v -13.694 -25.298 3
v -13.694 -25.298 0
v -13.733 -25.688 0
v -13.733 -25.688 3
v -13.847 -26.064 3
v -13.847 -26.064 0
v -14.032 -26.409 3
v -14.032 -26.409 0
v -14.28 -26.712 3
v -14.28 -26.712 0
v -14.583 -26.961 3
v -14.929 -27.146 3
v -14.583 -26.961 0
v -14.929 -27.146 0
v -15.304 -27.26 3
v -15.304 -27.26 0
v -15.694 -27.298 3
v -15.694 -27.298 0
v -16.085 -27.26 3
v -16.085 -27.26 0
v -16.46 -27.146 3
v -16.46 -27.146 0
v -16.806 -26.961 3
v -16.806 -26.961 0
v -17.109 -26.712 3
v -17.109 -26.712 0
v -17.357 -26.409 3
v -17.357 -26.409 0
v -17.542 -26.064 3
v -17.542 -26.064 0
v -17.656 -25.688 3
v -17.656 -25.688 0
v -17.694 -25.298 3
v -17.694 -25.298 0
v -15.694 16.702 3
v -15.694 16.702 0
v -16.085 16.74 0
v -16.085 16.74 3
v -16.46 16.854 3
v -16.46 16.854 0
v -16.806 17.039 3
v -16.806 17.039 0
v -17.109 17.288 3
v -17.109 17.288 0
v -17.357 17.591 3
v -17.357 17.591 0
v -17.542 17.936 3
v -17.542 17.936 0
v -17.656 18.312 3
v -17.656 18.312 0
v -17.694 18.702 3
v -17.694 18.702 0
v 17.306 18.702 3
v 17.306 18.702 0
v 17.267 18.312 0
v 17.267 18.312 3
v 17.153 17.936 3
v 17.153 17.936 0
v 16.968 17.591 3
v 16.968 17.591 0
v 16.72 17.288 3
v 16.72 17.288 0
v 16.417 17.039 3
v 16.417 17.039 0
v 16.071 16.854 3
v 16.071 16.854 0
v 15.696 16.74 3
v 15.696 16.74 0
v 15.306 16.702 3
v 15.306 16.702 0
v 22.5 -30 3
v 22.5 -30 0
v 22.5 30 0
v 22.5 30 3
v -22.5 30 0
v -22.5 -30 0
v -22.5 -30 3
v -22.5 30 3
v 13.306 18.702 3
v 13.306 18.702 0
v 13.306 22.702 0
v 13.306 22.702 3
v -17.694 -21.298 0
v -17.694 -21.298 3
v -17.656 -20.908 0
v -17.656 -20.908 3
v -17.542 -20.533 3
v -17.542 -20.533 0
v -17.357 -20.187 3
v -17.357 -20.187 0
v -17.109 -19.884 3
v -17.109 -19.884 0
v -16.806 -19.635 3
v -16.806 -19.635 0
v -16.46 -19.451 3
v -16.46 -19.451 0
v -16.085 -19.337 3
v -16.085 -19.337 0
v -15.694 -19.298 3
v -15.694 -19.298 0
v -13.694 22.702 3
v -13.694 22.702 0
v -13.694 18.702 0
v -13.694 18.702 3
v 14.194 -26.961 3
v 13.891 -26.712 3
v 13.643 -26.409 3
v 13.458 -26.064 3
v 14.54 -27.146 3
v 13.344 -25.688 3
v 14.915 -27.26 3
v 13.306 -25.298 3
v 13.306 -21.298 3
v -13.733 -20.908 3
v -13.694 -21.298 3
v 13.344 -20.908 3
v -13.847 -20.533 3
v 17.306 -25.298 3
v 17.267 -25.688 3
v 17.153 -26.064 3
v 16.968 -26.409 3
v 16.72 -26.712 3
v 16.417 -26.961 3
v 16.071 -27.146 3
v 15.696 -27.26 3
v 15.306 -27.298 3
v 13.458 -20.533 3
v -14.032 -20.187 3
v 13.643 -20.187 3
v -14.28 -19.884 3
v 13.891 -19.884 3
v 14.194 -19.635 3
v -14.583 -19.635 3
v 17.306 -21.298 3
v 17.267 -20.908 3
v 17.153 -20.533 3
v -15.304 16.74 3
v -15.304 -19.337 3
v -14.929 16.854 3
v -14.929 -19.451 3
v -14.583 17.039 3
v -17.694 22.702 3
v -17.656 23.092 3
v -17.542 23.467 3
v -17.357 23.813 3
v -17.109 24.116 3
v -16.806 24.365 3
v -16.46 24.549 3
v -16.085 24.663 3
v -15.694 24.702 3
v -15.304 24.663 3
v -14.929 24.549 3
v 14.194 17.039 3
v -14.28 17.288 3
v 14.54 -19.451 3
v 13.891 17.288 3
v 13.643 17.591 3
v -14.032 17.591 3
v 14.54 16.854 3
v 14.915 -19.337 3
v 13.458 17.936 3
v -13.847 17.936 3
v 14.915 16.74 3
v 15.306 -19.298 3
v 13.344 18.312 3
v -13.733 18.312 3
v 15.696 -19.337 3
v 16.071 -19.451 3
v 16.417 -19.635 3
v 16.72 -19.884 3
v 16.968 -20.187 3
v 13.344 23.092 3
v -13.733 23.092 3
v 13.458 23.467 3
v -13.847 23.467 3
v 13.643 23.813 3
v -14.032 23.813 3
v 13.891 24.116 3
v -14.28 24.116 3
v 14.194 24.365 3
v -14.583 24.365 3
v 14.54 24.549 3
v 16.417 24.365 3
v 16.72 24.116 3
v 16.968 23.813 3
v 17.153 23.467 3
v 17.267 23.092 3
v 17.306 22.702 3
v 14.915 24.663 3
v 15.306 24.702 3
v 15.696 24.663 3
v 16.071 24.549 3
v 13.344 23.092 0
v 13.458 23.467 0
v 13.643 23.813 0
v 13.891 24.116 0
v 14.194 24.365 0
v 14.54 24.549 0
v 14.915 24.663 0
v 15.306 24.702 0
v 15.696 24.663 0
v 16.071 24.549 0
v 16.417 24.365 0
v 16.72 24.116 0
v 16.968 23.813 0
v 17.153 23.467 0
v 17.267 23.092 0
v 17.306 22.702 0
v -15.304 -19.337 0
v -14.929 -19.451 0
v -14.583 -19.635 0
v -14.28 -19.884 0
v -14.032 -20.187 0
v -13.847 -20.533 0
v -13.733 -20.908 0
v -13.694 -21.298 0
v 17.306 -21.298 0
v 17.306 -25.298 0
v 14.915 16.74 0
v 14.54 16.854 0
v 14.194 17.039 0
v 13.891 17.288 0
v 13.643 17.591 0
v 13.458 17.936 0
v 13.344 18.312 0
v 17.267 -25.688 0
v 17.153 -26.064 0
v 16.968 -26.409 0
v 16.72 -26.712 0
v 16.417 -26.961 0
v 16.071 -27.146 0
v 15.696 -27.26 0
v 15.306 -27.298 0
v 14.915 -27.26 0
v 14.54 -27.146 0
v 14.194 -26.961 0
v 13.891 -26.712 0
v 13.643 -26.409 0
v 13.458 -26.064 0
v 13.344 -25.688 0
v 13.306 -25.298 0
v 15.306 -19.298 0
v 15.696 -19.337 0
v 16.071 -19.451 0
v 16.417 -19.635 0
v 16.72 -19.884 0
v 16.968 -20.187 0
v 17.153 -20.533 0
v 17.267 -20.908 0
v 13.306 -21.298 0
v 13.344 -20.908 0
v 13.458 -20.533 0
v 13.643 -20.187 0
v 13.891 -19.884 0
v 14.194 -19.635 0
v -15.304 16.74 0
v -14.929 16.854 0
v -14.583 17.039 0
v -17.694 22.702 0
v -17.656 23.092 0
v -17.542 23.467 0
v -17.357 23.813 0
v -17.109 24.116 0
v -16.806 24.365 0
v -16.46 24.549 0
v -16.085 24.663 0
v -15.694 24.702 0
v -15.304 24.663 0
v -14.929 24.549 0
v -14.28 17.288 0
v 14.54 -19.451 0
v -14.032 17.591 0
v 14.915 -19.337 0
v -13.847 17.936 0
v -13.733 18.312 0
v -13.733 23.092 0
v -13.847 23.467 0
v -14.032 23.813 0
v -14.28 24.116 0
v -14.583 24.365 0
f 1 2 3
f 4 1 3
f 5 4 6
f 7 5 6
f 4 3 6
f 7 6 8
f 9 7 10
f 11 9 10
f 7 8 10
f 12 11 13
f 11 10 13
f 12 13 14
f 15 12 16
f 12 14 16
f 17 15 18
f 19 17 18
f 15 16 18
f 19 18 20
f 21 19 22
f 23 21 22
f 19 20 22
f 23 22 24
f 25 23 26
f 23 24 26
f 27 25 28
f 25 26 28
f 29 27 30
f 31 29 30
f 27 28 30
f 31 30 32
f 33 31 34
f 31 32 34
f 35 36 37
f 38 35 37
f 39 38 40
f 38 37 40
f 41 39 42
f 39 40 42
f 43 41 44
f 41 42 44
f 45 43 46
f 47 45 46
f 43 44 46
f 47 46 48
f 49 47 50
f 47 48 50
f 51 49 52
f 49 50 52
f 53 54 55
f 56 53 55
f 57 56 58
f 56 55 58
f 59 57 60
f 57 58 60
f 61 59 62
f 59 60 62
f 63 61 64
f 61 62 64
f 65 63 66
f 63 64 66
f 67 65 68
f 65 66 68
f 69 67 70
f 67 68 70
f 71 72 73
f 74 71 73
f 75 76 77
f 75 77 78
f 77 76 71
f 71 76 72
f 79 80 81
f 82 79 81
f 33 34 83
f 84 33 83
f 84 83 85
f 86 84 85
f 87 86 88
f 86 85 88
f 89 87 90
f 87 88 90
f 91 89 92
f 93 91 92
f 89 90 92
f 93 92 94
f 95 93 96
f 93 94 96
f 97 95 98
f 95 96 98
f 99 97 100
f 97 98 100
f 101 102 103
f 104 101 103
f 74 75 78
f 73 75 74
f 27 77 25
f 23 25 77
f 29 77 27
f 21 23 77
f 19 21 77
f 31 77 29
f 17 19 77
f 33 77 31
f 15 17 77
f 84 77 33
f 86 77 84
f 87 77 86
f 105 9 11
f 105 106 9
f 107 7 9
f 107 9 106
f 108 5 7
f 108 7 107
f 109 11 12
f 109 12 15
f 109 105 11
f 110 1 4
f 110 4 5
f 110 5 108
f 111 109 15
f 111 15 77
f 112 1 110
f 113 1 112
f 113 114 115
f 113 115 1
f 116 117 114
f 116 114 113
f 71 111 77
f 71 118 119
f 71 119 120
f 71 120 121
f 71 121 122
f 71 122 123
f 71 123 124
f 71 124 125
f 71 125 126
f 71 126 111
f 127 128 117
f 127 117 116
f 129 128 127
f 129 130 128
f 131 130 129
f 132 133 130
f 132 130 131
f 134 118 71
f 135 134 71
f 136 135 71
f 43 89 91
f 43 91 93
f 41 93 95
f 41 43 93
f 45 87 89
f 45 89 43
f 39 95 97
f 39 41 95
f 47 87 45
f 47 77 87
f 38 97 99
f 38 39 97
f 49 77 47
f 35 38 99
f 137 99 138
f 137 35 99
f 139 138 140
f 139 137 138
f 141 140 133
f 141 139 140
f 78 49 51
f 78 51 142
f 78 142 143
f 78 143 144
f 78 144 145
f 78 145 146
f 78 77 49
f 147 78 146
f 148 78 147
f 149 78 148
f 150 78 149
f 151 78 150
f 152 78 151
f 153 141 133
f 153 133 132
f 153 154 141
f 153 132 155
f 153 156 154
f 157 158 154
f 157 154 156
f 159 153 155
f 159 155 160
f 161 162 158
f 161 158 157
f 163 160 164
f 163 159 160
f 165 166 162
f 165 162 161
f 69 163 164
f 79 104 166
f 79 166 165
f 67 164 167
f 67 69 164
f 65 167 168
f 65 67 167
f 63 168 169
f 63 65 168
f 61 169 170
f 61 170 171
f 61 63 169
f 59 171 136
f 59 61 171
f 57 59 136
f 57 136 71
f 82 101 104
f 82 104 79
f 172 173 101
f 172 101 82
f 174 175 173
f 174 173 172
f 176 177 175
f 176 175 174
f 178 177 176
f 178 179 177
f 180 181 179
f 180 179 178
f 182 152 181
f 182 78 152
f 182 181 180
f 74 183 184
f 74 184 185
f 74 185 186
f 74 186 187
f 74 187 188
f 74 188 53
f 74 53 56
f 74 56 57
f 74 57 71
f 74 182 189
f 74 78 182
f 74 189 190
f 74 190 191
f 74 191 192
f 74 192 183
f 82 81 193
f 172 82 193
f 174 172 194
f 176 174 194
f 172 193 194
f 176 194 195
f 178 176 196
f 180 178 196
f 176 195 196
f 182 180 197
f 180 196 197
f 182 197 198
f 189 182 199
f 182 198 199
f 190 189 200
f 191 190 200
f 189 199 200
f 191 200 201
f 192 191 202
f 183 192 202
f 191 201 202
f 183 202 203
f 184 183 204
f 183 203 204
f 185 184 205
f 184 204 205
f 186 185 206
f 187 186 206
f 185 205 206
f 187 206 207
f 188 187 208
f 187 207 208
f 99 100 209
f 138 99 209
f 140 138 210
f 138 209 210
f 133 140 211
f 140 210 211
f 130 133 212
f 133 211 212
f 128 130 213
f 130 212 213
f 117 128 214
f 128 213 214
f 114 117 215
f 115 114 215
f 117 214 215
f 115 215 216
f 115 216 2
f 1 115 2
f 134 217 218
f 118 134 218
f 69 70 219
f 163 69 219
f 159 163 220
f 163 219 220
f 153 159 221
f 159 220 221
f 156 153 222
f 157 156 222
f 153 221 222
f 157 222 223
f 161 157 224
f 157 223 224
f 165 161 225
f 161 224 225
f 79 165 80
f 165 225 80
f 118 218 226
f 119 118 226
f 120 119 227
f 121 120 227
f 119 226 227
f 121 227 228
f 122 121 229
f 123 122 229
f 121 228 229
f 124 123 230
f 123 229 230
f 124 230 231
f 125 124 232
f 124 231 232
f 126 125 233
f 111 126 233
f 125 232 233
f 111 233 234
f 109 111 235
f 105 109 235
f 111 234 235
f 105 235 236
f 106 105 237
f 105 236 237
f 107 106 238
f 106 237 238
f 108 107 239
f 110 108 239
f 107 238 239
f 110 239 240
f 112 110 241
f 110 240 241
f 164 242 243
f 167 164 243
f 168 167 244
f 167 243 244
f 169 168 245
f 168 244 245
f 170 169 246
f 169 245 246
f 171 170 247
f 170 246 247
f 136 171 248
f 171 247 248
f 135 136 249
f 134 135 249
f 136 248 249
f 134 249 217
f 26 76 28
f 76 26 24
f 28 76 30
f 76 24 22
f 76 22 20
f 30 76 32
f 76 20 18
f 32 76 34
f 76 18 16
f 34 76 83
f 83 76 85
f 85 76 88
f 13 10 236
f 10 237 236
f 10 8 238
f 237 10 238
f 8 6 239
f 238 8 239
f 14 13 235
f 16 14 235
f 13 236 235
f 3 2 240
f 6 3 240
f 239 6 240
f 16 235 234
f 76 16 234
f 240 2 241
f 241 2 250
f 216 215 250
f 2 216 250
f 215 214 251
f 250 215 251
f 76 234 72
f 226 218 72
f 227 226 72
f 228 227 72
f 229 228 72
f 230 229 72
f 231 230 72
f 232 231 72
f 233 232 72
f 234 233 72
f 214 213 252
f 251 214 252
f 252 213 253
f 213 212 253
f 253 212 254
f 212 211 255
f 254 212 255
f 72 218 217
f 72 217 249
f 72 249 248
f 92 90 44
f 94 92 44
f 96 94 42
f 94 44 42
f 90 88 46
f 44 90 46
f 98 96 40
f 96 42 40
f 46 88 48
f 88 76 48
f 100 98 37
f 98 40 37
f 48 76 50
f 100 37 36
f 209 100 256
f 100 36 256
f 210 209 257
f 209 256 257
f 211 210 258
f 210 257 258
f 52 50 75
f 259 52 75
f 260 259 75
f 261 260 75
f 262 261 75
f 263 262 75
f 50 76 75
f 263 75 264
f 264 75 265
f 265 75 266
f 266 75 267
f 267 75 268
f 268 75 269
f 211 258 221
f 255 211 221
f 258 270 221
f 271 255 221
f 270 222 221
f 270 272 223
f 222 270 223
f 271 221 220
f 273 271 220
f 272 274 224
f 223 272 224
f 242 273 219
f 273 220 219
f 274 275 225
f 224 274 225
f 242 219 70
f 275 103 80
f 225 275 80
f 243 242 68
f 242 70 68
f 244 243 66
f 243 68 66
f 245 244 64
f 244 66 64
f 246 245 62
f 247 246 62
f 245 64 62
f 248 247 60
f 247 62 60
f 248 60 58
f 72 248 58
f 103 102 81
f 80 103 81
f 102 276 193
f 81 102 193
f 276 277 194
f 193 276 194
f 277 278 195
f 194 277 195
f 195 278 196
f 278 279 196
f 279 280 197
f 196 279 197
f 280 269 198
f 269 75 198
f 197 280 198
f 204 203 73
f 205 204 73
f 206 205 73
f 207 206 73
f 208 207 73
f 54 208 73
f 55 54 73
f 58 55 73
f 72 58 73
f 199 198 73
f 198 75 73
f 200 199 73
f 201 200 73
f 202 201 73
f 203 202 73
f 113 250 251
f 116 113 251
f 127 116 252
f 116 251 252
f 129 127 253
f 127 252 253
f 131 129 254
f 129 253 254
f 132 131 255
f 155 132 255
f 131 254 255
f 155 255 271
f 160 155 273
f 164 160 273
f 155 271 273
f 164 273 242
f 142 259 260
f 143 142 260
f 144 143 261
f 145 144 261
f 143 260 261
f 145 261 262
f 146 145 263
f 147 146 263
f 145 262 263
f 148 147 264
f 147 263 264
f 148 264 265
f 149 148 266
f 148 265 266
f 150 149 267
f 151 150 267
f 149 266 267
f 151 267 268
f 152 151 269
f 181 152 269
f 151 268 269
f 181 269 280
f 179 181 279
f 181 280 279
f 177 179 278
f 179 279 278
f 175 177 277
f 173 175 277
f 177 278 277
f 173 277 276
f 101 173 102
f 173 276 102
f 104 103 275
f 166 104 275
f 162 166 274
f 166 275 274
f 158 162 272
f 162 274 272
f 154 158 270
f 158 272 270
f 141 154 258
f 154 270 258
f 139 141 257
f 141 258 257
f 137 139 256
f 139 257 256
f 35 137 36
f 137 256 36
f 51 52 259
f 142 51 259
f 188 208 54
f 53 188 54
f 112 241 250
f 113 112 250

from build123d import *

# Parameters (mm, degrees)
F0_W     = 45
F0_H     = 60
F1_DEPTH = 3


with BuildPart() as f1:
    # F0 (on Top) → F1 (new body)
    with BuildSketch(Plane.XY):
        Rectangle(F0_W, F0_H)
        with BuildLine():
            ThreePointArc((-13.6944653346, -25.298272824), (-15.6944653346, -27.298272824), (-17.6944653346, -25.298272824))
            Line((-17.6944653346, -25.298272824), (-17.6944653346, -21.298272824))
            ThreePointArc((-17.6944653346, -21.298272824), (-17.1086788969, -19.8840592617), (-15.6944653346, -19.298272824))
            Line((-15.6944653346, -19.298272824), (-15.6944653346, 16.701727176))
            ThreePointArc((-15.6944653346, 16.701727176), (-17.1086788969, 17.2875136136), (-17.6944653346, 18.701727176))
            Line((-17.6944653346, 18.701727176), (-17.6944653346, 22.701727176))
            ThreePointArc((-17.6944653346, 22.701727176), (-15.6944653346, 24.701727176), (-13.6944653346, 22.701727176))
            Line((-13.6944653346, 22.701727176), (-13.6944653346, 20.701727176))
            Line((-13.6944653346, 20.701727176), (13.3055346654, 20.701727176))
            Line((13.3055346654, 20.701727176), (13.3055346654, 22.701727176))
            ThreePointArc((13.3055346654, 22.701727176), (15.3055346654, 24.701727176), (17.3055346654, 22.701727176))
            Line((17.3055346654, 22.701727176), (17.3055346654, 18.701727176))
            ThreePointArc((17.3055346654, 18.701727176), (16.7197482278, 17.2875136136), (15.3055346654, 16.701727176))
            Line((15.3055346654, 16.701727176), (15.3055346654, -19.298272824))
            ThreePointArc((15.3055346654, -19.298272824), (16.7197482278, -19.8840592617), (17.3055346654, -21.298272824))
            Line((17.3055346654, -21.298272824), (17.3055346654, -25.298272824))
            ThreePointArc((17.3055346654, -25.298272824), (15.3055346654, -27.298272824), (13.3055346654, -25.298272824))
            Line((13.3055346654, -25.298272824), (13.3055346654, -23.298272824))
            Line((13.3055346654, -23.298272824), (-13.6944653346, -23.298272824))
            Line((-13.6944653346, -23.298272824), (-13.6944653346, -25.298272824))
        make_face(mode=Mode.SUBTRACT)
        with BuildLine():
            Line((-13.6944653346, -21.298272824), (-13.6944653346, -23.298272824))
            Line((-13.6944653346, -23.298272824), (13.3055346654, -23.298272824))
            Line((13.3055346654, -23.298272824), (13.3055346654, -21.298272824))
            ThreePointArc((13.3055346654, -21.298272824), (13.8913211031, -19.8840592617), (15.3055346654, -19.298272824))
            Line((15.3055346654, -19.298272824), (15.3055346654, 16.701727176))
            ThreePointArc((15.3055346654, 16.701727176), (13.8913211031, 17.2875136136), (13.3055346654, 18.701727176))
            Line((13.3055346654, 18.701727176), (13.3055346654, 20.701727176))
            Line((13.3055346654, 20.701727176), (-13.6944653346, 20.701727176))
            Line((-13.6944653346, 20.701727176), (-13.6944653346, 18.701727176))
            ThreePointArc((-13.6944653346, 18.701727176), (-14.2802517722, 17.2875136136), (-15.6944653346, 16.701727176))
            Line((-15.6944653346, 16.701727176), (-15.6944653346, -19.298272824))
            ThreePointArc((-15.6944653346, -19.298272824), (-14.2802517722, -19.8840592617), (-13.6944653346, -21.298272824))
        make_face()
    extrude(amount=F1_DEPTH)


solid = f1.part
